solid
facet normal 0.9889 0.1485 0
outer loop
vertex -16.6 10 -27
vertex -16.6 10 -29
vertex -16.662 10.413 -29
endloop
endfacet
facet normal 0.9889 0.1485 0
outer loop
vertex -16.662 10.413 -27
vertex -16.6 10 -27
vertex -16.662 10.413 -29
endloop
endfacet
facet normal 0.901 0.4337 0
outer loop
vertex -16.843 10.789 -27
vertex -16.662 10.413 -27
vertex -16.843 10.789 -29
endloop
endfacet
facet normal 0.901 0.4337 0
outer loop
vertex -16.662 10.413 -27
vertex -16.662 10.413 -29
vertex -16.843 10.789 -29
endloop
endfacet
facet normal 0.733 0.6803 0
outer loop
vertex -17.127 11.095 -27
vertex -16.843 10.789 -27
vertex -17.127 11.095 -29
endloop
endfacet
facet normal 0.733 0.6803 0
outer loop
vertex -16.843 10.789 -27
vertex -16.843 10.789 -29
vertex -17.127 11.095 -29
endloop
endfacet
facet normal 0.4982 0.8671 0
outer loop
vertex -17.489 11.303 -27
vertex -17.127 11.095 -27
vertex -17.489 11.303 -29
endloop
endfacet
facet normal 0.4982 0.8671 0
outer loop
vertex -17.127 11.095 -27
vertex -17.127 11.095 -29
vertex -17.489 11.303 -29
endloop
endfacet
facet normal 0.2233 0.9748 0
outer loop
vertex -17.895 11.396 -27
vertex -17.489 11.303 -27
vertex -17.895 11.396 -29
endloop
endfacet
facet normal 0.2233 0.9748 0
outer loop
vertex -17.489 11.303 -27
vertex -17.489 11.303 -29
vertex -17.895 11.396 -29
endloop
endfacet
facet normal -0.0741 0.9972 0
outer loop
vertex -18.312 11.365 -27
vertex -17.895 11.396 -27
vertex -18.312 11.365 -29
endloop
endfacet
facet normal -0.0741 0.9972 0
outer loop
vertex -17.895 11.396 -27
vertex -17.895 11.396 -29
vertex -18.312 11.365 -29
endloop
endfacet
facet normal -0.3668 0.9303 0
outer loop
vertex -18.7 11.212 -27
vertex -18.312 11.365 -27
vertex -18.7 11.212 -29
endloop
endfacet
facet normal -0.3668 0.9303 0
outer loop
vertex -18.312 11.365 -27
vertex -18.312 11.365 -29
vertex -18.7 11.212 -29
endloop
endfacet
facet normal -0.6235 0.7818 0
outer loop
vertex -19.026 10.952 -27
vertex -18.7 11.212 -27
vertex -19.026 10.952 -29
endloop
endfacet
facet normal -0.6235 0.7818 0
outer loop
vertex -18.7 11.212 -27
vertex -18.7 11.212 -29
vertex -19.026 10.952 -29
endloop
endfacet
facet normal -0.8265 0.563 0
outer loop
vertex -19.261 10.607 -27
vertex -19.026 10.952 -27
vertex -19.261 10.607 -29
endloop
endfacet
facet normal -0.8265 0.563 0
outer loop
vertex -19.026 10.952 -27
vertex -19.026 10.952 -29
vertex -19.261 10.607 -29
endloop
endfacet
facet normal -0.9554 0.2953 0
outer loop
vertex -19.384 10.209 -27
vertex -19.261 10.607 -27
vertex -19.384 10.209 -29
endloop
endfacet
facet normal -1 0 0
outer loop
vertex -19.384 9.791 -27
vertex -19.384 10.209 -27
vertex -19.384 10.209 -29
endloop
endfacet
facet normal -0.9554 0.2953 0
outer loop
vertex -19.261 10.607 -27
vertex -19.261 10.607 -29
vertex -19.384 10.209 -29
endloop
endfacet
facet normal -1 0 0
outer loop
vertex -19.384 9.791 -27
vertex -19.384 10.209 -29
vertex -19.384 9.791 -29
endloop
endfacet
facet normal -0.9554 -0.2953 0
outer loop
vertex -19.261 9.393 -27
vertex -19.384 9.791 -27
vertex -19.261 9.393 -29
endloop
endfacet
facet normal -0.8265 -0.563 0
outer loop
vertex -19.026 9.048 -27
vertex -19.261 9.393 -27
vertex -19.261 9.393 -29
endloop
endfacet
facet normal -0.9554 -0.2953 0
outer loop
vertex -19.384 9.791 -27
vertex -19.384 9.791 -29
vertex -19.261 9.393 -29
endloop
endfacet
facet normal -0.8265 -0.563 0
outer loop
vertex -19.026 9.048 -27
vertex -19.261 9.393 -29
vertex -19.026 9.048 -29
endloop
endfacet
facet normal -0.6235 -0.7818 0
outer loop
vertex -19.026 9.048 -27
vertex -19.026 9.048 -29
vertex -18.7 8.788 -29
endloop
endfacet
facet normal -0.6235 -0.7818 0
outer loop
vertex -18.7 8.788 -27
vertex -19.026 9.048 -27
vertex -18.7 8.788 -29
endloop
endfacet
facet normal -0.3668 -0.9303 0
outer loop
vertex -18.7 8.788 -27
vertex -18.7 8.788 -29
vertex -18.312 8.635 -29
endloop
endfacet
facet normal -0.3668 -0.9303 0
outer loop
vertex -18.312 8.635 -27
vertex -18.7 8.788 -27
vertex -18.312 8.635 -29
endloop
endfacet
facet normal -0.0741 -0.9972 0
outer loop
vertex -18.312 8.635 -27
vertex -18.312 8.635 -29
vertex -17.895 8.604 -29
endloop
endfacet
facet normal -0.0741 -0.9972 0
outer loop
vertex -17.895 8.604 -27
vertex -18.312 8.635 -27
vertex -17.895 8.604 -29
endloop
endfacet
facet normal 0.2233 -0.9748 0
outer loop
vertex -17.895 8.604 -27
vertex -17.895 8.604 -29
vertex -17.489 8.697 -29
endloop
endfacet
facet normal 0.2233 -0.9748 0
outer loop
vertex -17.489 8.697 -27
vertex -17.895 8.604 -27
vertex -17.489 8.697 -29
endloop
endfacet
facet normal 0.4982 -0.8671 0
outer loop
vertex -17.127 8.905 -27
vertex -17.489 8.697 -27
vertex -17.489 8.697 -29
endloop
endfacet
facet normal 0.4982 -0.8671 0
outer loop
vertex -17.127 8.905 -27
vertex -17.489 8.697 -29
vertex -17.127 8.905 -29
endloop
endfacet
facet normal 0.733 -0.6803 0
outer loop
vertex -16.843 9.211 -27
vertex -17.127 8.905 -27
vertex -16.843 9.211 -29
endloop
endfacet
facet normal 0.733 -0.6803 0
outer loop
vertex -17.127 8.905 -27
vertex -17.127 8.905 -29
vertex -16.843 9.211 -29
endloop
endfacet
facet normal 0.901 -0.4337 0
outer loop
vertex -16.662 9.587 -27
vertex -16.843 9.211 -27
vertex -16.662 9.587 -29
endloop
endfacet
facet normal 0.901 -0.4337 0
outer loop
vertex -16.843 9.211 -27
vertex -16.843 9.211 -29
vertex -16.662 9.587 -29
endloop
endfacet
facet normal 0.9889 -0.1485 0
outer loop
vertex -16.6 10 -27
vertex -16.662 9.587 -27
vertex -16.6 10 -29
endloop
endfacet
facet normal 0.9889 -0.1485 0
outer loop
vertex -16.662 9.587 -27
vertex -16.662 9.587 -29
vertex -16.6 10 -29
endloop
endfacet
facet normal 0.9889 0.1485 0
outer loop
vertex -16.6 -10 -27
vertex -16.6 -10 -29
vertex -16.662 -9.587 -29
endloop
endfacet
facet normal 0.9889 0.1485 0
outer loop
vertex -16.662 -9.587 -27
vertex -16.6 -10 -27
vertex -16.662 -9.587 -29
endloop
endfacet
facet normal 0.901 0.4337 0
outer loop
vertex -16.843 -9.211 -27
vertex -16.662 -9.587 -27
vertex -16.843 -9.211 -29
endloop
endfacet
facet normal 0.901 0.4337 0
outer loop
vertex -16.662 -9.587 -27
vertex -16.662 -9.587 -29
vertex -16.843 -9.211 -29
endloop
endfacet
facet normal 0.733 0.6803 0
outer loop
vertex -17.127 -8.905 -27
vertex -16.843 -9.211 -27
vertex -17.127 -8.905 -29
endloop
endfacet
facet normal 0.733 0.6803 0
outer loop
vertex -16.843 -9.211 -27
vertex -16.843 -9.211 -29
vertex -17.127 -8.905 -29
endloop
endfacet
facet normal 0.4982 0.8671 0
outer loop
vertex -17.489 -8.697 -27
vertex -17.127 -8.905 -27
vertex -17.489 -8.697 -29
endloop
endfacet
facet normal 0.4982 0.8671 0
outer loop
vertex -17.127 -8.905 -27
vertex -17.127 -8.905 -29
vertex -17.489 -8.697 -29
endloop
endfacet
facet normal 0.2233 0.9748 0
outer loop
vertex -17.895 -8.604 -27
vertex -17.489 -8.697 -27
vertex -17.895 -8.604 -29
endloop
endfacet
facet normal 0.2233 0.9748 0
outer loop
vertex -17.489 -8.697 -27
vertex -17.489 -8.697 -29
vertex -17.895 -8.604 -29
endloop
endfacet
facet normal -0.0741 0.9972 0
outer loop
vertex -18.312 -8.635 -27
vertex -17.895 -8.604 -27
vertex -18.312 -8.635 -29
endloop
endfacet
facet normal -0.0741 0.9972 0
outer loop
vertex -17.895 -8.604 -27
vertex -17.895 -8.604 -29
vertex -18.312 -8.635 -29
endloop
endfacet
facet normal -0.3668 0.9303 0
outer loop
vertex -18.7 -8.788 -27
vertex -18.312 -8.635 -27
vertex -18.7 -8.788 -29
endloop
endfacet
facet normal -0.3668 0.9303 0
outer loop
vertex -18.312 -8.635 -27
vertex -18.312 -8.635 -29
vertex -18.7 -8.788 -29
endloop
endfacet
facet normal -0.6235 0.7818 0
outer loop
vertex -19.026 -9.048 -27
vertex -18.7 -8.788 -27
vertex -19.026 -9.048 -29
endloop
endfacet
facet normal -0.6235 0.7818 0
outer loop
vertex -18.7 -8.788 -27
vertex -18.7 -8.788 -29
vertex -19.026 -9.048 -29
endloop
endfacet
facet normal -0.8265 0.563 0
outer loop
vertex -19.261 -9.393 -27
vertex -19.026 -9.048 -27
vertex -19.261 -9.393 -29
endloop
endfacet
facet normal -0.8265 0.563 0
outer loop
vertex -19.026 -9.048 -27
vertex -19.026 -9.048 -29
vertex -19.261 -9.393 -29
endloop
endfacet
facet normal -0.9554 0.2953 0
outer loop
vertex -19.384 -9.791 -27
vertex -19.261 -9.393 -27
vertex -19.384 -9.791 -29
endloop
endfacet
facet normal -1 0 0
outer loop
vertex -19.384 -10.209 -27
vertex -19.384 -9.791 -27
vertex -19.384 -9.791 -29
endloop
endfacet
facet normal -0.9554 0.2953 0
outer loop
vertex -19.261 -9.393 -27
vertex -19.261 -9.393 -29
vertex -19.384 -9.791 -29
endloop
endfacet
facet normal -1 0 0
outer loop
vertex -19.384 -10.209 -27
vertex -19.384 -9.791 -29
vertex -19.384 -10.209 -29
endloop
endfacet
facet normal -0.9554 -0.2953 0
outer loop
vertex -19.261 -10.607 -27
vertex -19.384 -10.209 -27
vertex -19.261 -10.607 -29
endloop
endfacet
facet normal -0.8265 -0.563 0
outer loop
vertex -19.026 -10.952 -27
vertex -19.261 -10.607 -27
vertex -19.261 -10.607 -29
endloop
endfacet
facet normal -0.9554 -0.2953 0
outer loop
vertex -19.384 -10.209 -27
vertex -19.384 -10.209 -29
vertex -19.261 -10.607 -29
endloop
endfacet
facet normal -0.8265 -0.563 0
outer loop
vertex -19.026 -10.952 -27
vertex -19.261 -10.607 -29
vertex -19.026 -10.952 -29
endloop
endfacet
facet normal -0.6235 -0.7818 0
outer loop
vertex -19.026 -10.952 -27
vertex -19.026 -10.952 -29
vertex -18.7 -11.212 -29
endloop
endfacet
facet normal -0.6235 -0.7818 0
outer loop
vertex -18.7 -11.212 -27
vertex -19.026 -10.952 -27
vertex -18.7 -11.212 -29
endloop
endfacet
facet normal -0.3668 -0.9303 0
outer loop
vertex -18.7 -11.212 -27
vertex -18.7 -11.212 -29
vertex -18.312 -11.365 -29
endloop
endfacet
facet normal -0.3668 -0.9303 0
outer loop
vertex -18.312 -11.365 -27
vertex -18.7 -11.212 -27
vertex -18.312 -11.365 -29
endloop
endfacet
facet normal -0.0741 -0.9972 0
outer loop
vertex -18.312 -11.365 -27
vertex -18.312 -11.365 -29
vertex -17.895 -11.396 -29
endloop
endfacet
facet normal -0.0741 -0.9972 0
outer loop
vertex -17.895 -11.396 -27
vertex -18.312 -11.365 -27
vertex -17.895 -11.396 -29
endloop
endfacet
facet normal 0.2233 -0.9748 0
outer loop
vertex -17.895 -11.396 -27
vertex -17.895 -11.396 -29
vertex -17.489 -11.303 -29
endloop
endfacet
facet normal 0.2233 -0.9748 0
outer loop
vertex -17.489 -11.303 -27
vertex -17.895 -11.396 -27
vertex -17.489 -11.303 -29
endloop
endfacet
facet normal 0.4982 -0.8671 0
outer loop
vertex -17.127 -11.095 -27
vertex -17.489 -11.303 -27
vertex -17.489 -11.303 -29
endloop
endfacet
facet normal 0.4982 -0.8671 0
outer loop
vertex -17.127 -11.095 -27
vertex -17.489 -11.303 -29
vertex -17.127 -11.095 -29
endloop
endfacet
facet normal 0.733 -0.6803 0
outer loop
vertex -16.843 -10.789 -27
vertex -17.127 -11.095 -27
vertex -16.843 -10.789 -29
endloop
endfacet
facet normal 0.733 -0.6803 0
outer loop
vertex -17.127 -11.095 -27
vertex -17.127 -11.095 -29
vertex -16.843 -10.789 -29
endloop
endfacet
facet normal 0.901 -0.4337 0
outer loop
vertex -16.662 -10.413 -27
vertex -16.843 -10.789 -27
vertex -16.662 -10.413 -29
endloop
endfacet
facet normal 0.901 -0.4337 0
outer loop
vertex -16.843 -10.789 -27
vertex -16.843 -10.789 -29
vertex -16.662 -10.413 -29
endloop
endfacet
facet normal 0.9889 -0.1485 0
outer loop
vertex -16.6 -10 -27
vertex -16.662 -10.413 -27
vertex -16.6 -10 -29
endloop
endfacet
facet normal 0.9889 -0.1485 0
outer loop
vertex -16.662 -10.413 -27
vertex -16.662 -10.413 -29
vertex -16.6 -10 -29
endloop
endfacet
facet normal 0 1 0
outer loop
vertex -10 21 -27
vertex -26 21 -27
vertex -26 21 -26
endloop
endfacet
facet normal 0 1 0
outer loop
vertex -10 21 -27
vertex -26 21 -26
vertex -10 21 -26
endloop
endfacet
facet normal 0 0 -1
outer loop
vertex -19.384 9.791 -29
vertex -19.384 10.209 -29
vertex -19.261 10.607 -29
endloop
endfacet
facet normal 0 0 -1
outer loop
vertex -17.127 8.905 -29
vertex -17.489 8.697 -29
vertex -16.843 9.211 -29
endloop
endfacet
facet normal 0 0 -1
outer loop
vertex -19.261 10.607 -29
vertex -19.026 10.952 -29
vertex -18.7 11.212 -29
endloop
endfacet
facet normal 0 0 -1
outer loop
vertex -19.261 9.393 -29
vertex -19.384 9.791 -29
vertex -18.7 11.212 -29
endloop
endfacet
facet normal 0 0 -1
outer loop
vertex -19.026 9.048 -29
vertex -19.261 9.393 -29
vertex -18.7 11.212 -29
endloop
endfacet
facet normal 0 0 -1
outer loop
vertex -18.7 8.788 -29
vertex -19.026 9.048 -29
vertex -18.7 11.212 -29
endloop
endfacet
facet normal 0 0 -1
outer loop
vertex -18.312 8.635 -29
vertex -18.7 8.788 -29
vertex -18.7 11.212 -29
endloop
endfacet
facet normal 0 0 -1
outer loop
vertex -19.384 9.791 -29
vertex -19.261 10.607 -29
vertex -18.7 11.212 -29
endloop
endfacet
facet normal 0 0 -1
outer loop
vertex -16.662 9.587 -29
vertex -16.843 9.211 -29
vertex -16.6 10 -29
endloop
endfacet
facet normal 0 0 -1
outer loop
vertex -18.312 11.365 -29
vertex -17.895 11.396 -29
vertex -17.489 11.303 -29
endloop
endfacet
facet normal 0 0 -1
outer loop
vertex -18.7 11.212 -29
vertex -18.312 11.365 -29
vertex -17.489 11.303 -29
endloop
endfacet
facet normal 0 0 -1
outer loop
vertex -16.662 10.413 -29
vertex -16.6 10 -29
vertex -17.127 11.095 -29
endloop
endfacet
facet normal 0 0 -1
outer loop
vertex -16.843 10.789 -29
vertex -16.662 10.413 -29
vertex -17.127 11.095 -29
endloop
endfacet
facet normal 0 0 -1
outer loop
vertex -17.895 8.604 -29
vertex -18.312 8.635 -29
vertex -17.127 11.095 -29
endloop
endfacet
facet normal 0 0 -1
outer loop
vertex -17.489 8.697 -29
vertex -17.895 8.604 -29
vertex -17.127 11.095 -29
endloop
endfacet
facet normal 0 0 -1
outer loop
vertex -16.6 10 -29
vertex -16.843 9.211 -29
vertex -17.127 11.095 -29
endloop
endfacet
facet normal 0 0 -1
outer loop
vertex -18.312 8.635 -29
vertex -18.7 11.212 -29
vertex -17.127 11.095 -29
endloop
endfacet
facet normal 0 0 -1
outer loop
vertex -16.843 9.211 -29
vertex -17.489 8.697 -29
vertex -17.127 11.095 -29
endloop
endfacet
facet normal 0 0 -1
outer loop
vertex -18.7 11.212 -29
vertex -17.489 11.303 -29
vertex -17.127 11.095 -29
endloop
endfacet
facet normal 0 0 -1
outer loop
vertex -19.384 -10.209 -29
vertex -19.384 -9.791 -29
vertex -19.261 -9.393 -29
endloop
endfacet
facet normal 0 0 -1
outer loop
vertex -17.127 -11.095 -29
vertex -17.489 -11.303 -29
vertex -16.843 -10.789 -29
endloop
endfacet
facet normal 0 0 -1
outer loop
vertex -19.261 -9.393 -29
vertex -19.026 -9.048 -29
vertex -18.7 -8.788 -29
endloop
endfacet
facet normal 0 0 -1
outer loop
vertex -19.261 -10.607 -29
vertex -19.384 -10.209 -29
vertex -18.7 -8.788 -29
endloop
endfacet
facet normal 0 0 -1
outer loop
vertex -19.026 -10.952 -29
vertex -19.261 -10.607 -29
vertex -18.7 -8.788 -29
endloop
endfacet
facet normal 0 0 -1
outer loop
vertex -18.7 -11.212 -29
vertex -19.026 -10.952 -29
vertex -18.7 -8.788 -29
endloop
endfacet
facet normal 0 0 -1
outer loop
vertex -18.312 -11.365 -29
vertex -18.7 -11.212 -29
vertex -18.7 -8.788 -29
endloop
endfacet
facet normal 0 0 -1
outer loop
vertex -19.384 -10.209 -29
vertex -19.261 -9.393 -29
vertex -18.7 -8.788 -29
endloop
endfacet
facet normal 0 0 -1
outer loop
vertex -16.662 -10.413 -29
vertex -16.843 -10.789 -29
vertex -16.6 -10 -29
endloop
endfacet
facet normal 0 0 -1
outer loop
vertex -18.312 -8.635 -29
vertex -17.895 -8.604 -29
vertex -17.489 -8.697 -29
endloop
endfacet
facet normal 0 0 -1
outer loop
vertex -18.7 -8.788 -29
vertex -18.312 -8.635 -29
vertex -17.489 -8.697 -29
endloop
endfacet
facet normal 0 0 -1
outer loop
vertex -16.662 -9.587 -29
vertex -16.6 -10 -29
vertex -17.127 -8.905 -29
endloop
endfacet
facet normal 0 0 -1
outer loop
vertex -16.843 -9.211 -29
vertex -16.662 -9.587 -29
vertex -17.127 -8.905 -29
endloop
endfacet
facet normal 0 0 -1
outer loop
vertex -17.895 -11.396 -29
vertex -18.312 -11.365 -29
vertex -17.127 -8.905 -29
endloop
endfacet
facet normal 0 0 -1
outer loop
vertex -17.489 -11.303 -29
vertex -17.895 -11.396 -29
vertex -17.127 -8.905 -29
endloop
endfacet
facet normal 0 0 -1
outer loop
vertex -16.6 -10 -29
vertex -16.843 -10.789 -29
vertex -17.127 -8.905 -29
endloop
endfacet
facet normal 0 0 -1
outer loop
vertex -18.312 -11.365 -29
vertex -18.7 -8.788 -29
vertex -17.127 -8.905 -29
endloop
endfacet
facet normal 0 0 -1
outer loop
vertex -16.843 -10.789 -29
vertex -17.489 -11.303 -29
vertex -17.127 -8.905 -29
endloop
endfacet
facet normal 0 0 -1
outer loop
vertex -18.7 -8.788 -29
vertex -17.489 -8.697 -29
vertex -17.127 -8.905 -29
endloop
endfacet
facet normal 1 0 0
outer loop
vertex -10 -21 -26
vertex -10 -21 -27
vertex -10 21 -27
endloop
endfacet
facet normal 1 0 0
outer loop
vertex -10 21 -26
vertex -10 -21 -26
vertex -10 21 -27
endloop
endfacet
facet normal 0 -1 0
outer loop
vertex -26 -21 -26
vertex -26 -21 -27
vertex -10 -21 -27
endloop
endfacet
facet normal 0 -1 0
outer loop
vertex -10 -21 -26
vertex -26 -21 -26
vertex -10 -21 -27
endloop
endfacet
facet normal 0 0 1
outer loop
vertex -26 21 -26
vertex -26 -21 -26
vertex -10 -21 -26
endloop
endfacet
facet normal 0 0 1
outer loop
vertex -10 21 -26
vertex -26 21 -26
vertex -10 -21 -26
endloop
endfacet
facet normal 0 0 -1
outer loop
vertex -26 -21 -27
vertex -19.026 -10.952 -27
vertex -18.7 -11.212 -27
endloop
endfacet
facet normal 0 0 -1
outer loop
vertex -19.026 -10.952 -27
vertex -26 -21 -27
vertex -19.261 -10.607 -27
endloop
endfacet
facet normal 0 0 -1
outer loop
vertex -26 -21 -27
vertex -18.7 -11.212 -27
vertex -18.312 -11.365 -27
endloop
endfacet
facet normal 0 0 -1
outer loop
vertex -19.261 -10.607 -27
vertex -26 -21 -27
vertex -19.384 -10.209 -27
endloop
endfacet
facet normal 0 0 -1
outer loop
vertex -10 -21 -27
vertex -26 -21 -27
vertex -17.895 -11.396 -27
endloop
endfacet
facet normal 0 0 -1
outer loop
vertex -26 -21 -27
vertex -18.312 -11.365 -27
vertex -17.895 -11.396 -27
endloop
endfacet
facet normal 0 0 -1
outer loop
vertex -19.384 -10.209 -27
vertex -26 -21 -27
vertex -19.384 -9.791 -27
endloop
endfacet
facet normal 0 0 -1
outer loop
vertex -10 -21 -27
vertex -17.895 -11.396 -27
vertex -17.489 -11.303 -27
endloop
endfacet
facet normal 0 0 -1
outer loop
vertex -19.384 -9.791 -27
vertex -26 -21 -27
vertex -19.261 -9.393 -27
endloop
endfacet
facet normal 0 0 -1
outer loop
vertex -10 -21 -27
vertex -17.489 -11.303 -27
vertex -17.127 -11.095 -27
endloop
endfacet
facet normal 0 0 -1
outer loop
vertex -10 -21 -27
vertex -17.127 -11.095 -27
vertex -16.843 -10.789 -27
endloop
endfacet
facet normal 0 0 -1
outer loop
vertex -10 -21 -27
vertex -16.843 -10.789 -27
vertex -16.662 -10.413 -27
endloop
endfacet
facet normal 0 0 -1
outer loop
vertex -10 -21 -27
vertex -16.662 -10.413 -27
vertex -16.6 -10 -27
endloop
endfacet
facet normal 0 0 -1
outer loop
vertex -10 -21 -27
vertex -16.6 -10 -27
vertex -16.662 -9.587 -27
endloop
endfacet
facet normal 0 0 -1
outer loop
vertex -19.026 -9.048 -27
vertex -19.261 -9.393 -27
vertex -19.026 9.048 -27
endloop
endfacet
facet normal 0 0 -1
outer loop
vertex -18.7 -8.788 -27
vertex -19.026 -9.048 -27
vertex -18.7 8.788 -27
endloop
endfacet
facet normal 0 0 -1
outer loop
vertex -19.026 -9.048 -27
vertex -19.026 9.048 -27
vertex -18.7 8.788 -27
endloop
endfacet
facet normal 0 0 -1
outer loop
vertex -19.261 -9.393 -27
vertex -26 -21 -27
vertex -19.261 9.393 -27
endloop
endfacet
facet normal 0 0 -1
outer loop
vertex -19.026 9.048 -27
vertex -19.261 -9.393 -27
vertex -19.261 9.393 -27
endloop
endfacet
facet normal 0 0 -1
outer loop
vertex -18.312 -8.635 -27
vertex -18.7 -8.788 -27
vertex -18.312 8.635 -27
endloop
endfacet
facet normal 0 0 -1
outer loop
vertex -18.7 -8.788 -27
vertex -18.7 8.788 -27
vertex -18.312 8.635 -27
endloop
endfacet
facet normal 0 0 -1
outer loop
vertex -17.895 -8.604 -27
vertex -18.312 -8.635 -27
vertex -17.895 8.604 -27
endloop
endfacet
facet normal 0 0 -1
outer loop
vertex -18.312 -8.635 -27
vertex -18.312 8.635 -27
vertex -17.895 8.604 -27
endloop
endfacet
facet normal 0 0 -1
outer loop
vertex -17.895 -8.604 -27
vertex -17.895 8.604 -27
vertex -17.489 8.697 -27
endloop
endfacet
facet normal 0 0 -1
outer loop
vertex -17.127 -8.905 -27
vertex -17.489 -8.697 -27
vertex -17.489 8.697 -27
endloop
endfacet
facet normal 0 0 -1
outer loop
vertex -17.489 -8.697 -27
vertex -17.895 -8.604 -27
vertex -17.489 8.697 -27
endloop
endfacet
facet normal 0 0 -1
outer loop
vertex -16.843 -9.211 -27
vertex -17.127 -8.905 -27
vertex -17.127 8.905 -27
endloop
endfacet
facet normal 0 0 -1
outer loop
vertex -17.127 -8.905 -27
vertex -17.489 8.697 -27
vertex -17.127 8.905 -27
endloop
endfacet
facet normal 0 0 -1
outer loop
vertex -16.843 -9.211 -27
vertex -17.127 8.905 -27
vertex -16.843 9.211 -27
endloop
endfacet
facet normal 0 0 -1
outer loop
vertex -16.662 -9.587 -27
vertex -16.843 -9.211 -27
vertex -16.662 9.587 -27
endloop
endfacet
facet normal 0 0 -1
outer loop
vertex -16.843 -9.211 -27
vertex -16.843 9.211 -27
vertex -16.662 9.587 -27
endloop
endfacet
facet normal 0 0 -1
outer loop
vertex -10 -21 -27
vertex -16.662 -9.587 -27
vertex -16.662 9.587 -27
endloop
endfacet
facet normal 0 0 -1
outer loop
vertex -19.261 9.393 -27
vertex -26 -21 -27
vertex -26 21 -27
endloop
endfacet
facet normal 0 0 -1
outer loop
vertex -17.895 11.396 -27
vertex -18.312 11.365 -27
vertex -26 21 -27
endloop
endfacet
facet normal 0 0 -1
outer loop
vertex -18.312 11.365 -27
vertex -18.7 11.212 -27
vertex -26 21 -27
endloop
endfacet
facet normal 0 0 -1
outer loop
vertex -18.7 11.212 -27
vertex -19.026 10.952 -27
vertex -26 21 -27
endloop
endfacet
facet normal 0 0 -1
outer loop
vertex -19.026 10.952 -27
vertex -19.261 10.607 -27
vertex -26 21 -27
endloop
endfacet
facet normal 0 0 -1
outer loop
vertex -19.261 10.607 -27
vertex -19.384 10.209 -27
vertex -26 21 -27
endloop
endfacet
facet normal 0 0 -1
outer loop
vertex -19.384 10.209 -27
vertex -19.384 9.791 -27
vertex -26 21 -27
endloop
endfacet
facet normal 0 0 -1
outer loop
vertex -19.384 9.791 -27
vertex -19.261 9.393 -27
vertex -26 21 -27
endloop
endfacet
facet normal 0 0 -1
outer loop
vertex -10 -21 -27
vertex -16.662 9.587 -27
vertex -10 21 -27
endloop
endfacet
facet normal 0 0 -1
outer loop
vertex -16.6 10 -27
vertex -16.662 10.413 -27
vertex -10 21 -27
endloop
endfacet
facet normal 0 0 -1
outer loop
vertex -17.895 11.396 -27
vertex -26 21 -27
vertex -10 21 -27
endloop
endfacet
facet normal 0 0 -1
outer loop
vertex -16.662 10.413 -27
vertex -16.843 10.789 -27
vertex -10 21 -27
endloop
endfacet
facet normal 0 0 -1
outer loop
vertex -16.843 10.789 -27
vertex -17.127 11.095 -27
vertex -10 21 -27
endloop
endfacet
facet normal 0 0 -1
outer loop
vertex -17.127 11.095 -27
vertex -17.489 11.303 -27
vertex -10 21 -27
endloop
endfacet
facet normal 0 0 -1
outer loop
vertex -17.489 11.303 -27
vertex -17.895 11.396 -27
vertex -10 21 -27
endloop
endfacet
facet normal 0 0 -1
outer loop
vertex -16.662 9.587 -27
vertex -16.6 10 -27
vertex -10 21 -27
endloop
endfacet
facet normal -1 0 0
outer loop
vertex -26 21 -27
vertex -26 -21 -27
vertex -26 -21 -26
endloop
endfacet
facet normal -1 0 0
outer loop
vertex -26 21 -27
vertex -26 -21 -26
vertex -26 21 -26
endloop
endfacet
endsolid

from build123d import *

# Parameters (mm, degrees)
CYLINDER017_R     = 1.4
CYLINDER017_DEPTH = 2
CYLINDER018_R     = 1.4
CYLINDER018_DEPTH = 2
BOX008_W          = 16
BOX008_H          = 42
BOX008_DEPTH      = 1


with BuildPart() as zylinder017:
    # Cylinder017 → Cylinder017 (new body)
    with BuildSketch(Plane(origin=(16.5, 10, -29.5), x_dir=(1, 0, 0), z_dir=(0, 0, 1))):
        Circle(CYLINDER017_R)
    extrude(amount=CYLINDER017_DEPTH)


with BuildPart() as zylinder018:
    # Cylinder018 → Cylinder018 (new body)
    with BuildSketch(Plane(origin=(16.5, -10, -29.5), x_dir=(1, 0, 0), z_dir=(0, 0, 1))):
        Circle(CYLINDER018_R)
    extrude(amount=CYLINDER018_DEPTH)


with BuildPart() as fusion007:
    # Box008 → Box008 (new body)
    with BuildSketch(Plane(origin=(8.5, -21, -27.5), x_dir=(1, 0, 0), z_dir=(0, 0, 1))):
        with Locations((8, 21)):
            Rectangle(BOX008_W, BOX008_H)
    extrude(amount=BOX008_DEPTH)

    # Fusion007: union Zylinder017, Zylinder018
    add(zylinder017.part)
    add(zylinder018.part)


with BuildPart() as fusion007_1:
    # Fusion007 placement: moved
    add(fusion007.part.moved(Location((-34.5, 0, 0.5))))


solid = fusion007_1.part
